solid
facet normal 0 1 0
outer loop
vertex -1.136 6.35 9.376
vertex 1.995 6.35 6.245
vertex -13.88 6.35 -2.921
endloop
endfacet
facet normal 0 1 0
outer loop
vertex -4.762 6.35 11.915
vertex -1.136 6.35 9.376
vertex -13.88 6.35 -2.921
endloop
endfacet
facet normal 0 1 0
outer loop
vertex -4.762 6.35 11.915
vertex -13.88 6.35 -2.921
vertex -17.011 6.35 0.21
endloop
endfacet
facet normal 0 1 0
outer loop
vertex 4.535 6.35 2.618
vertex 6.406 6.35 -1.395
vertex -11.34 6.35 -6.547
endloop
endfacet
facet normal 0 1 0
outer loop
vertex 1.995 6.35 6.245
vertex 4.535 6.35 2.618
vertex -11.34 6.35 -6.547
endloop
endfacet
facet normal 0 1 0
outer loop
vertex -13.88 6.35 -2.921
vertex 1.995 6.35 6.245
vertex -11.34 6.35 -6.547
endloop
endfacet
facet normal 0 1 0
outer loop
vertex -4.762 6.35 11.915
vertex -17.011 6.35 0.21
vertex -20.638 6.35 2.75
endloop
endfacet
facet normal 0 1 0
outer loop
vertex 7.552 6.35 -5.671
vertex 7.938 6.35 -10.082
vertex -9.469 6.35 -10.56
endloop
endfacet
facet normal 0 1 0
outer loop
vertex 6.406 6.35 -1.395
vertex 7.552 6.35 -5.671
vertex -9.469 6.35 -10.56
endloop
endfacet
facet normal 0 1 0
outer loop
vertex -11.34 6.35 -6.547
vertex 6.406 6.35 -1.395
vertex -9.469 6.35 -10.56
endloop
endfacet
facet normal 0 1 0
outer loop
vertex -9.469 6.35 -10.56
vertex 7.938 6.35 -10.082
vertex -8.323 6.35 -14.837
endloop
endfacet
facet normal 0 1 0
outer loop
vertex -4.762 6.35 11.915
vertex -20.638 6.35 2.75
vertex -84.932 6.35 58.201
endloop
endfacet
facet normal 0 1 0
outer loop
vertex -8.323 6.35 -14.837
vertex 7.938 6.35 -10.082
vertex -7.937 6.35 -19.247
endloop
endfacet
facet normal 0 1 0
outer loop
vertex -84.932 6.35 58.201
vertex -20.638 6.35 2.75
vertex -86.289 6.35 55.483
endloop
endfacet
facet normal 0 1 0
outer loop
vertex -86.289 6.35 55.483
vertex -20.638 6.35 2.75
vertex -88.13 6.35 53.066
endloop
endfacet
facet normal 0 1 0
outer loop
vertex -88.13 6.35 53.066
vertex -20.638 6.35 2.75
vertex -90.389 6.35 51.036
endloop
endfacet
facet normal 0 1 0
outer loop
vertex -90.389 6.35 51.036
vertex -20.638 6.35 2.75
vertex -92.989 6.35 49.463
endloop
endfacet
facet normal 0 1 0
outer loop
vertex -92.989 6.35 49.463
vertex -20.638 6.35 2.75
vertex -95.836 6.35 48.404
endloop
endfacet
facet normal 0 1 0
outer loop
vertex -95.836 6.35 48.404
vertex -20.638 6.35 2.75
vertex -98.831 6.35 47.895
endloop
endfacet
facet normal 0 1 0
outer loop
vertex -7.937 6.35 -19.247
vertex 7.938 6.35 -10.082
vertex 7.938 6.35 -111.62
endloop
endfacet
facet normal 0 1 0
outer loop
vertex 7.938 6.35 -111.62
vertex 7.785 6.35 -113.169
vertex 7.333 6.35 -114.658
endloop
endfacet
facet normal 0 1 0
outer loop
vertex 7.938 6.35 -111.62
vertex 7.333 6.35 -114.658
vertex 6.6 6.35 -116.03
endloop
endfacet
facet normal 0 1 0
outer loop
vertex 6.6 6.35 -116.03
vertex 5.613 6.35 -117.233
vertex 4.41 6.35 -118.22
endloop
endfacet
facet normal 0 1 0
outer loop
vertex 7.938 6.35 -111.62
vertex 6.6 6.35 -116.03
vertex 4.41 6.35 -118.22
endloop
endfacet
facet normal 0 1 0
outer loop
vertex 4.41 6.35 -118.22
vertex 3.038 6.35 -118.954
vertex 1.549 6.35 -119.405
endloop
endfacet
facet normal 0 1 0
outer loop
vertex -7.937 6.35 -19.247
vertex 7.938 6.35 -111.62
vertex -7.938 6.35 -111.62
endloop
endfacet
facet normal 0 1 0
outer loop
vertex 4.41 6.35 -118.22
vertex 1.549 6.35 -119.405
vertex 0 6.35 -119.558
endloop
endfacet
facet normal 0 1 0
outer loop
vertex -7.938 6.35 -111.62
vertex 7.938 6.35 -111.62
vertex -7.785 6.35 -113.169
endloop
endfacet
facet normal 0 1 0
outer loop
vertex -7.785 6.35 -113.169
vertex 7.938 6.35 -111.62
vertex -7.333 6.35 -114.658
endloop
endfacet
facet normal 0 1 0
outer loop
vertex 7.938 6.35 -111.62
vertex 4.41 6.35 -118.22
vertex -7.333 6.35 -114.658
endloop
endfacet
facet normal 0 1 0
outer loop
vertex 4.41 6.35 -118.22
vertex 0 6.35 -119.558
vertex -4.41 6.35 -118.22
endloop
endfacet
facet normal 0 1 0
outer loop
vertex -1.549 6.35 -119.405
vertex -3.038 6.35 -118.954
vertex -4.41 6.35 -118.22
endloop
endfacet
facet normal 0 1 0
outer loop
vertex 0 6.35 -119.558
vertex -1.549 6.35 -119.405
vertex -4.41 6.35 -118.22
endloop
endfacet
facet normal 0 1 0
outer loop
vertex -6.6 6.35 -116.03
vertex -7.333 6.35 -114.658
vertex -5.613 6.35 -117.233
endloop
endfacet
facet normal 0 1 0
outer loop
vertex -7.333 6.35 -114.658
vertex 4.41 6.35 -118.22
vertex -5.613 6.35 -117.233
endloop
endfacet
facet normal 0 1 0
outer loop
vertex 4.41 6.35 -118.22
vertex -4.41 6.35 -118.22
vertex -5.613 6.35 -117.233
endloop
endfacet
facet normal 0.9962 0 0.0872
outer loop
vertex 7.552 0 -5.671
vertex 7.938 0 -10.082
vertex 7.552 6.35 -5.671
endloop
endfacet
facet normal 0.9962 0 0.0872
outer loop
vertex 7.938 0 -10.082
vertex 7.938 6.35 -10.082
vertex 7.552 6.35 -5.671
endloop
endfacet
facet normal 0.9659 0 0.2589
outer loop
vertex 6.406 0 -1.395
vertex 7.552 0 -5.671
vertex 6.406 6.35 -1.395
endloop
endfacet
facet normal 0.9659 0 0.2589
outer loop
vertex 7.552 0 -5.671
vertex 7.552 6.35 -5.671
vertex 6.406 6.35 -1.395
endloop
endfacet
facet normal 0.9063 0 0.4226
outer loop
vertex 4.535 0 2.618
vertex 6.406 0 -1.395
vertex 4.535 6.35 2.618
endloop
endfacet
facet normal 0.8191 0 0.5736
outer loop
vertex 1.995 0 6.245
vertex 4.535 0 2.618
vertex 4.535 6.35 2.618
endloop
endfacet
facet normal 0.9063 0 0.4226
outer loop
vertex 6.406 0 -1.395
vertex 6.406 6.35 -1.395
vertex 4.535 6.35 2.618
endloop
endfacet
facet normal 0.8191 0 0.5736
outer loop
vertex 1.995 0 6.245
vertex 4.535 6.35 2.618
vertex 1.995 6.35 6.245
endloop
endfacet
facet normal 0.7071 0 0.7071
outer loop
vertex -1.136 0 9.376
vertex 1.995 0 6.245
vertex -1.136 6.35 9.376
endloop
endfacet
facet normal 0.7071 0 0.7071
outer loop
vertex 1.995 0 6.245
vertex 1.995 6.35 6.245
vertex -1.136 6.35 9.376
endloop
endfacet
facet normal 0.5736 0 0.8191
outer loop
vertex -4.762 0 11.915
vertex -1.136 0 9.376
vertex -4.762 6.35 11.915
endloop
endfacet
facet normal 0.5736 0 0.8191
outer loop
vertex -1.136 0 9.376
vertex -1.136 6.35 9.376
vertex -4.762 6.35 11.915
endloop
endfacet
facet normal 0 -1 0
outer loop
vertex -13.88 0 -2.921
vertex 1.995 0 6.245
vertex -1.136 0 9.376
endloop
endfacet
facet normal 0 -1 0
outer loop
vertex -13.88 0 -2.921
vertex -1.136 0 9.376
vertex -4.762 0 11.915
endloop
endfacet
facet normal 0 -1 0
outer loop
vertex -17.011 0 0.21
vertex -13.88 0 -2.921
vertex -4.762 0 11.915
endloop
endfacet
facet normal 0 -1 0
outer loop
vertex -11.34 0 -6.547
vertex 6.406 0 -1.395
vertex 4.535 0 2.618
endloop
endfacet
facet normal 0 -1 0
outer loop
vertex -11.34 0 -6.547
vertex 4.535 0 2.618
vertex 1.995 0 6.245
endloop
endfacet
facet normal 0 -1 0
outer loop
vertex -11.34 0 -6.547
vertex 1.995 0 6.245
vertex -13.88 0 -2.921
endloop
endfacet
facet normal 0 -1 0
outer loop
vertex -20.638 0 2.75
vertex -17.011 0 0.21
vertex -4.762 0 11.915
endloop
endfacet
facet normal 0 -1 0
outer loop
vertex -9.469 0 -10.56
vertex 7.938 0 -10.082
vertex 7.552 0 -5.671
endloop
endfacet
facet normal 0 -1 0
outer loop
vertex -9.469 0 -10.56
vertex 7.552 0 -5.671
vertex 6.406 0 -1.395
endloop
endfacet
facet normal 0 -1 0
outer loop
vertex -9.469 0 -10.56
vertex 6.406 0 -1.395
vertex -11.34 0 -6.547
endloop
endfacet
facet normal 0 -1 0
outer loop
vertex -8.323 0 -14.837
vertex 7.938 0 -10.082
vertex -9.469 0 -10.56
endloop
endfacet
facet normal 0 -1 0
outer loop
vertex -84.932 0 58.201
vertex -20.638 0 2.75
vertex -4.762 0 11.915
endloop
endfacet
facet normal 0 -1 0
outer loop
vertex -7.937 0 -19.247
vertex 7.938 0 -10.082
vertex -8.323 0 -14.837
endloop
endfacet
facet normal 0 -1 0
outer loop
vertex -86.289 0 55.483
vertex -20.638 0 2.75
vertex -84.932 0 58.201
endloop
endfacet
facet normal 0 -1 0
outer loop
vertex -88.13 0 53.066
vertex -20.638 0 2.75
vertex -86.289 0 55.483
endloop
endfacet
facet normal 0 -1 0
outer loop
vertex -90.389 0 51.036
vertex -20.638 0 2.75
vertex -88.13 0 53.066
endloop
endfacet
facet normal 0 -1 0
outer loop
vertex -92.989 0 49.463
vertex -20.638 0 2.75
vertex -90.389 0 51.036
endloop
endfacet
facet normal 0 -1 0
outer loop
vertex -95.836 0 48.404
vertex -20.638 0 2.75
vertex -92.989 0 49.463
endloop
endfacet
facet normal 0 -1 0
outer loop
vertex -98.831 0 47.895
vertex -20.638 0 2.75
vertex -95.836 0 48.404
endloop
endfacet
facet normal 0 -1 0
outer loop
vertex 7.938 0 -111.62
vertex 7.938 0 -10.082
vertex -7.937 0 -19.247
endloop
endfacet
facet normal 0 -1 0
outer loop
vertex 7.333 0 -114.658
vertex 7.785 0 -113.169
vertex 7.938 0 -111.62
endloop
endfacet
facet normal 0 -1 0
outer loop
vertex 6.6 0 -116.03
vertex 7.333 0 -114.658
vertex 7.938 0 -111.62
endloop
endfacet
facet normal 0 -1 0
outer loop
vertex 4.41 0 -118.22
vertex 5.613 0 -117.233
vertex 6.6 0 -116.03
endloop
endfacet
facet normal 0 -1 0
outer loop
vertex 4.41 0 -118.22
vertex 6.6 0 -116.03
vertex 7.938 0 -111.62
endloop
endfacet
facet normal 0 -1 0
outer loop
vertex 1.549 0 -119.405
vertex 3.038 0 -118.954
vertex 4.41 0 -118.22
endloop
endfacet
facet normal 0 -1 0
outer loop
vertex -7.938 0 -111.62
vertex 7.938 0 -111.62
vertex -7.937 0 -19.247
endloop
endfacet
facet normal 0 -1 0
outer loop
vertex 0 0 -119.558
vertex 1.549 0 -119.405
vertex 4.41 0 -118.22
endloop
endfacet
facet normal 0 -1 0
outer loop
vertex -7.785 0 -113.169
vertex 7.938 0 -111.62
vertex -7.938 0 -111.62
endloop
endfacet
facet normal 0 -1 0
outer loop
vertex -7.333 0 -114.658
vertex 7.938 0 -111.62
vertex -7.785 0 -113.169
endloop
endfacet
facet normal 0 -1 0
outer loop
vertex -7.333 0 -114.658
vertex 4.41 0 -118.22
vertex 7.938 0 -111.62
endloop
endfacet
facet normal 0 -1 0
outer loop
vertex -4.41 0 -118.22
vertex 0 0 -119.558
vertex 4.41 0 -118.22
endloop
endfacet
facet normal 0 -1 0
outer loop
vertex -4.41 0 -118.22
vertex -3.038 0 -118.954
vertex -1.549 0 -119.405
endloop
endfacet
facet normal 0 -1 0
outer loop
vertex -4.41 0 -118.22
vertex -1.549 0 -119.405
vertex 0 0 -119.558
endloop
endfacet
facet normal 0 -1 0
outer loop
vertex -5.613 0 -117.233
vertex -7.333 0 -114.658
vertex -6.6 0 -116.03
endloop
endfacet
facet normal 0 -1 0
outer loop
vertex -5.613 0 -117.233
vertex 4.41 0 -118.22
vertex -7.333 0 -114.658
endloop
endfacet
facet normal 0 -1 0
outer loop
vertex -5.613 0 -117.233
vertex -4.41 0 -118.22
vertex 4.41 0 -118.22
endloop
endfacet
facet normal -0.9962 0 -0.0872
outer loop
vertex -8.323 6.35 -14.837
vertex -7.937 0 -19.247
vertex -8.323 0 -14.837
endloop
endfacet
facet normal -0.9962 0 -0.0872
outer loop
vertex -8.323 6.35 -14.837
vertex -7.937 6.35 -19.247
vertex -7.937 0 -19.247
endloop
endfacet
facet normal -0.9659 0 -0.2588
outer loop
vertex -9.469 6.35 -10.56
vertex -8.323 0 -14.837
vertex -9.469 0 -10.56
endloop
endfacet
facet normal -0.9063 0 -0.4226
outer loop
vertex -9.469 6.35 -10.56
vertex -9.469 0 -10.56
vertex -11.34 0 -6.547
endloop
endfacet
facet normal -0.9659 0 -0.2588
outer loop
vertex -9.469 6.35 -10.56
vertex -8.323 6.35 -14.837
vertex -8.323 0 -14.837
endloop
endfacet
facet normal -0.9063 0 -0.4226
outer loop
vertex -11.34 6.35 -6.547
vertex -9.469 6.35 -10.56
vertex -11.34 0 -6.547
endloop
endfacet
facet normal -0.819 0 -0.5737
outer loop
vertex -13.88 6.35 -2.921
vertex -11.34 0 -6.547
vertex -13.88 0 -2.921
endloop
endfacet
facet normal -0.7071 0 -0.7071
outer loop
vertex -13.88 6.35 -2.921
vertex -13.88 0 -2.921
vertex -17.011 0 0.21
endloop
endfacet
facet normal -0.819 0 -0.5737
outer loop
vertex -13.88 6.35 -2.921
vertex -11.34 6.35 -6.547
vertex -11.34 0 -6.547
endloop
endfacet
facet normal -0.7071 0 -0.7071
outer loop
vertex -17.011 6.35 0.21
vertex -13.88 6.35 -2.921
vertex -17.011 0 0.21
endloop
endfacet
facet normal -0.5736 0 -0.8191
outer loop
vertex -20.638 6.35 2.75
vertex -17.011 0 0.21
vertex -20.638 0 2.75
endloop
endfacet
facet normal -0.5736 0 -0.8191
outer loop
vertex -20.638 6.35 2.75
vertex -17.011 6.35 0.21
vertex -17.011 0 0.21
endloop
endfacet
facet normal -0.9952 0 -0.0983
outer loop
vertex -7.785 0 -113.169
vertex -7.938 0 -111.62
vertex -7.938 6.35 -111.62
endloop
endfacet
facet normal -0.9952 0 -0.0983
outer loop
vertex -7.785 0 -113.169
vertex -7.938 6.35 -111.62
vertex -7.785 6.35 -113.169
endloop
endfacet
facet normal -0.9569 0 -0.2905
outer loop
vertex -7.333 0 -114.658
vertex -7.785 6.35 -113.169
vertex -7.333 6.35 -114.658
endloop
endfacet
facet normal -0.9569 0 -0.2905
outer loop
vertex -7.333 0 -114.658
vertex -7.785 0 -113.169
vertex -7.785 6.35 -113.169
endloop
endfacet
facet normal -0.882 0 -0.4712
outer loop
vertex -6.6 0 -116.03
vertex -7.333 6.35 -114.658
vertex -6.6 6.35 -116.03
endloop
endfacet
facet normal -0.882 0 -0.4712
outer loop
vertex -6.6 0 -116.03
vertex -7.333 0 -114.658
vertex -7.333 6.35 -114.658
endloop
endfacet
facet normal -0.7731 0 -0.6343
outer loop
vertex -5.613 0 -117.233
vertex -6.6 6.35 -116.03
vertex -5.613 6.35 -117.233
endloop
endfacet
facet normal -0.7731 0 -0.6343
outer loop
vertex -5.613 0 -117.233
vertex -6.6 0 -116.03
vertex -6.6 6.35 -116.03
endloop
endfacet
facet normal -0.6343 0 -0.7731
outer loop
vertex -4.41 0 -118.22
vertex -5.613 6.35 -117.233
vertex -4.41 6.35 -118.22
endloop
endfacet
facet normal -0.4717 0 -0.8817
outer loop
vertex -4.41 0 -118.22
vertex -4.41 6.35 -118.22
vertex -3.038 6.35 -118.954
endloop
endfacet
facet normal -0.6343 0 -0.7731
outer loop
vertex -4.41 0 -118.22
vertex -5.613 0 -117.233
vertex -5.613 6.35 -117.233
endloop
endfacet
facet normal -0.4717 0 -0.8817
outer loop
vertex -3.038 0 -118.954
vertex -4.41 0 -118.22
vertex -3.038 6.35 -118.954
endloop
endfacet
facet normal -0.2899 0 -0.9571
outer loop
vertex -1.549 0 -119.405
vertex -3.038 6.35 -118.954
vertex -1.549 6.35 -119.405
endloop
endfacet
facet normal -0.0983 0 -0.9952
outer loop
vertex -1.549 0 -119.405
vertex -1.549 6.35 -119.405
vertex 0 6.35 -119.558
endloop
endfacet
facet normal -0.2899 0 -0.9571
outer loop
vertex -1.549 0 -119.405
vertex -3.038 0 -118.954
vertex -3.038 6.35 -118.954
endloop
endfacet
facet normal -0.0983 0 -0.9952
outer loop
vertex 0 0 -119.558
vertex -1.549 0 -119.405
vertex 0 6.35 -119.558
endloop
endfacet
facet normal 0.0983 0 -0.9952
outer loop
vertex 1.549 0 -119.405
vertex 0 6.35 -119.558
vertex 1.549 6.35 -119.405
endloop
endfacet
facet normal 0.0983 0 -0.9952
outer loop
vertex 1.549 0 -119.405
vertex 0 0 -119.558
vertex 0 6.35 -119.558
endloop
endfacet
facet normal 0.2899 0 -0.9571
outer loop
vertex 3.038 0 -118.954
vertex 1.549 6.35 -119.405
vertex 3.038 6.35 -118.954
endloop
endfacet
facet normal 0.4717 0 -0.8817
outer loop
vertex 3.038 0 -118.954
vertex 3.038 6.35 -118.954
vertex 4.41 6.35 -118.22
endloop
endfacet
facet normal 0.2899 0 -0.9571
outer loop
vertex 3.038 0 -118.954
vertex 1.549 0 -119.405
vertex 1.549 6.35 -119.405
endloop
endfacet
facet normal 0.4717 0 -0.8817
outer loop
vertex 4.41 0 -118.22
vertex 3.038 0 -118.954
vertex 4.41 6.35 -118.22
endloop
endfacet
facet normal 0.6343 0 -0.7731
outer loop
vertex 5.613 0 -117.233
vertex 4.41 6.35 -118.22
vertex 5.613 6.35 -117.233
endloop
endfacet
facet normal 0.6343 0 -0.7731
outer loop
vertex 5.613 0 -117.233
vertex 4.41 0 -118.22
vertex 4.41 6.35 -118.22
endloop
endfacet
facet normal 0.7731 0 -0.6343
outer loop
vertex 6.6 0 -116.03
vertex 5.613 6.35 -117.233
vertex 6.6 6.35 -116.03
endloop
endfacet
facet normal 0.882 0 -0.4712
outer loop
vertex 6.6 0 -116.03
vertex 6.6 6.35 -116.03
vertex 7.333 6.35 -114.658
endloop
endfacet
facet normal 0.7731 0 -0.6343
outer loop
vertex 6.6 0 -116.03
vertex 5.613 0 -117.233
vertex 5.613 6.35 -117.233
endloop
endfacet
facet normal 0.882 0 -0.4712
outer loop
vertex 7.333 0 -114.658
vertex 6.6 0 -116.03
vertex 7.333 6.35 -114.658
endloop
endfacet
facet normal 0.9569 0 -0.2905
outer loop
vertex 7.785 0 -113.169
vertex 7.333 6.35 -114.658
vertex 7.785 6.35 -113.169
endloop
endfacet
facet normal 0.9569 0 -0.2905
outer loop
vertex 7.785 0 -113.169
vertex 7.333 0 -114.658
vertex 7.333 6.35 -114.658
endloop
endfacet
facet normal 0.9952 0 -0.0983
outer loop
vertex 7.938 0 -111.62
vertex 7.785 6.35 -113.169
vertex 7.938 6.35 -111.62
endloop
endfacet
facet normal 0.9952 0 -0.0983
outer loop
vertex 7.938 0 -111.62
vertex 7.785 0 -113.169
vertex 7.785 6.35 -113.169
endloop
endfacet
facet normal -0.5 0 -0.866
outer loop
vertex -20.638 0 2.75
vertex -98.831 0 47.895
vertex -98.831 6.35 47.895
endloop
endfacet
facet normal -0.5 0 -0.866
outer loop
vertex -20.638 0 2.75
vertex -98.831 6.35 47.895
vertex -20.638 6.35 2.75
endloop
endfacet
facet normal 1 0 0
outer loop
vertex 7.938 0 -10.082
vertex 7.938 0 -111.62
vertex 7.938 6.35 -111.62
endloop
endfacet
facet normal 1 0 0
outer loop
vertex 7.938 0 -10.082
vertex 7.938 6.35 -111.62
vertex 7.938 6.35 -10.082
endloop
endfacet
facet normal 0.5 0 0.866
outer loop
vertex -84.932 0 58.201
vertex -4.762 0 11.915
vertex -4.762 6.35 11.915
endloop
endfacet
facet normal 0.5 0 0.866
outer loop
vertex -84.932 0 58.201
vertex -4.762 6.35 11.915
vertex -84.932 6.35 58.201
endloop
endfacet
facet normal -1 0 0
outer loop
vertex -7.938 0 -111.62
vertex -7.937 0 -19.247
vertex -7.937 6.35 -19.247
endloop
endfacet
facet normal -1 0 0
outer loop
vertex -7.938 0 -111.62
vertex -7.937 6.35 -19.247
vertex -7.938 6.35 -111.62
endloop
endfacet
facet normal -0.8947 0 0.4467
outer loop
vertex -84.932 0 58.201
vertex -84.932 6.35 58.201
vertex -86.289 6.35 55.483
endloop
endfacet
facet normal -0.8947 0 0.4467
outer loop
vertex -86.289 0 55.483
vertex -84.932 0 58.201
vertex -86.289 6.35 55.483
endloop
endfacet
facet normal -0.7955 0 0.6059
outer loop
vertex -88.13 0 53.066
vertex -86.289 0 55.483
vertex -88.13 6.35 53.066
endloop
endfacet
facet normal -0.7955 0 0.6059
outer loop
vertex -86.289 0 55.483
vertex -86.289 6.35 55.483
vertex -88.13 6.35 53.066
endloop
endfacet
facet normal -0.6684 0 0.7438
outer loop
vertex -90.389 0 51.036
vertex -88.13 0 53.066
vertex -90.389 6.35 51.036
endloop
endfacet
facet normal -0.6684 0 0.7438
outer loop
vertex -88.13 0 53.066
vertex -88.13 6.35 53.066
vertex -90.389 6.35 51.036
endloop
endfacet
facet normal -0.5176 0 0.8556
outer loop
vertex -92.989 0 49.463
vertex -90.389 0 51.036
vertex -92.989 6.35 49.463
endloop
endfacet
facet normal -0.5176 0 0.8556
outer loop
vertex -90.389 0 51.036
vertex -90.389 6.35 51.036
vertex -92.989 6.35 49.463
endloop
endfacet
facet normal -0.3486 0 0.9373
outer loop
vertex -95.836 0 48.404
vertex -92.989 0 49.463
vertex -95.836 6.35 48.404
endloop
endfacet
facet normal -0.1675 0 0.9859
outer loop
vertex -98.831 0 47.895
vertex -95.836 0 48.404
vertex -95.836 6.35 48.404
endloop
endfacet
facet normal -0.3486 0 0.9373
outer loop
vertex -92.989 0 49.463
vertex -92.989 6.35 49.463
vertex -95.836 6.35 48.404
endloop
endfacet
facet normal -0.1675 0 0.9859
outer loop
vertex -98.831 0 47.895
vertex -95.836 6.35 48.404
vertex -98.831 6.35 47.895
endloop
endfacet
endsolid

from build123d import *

# Parameters (mm, degrees)
BOSS_EXTRUDE1_DEPTH = 6.35
CUT_EXTRUDE1_DEPTH  = 158.804246512
FILLET1_R           = 25.4


with BuildPart() as part:
    # Sketch1 → Boss-Extrude1 (new body)
    with BuildSketch(Plane(origin=(0, 0, 0), x_dir=(1, 0, 0), z_dir=(0, 1, 0))):
        with BuildLine():
            Line((7.9375, 111.6203), (7.9375, -4.582717762))
            Line((7.9375, -4.582717762), (-90.893507667, -61.642826643))
            ThreePointArc((-90.893507667, -61.642826643), (-101.73633431, -58.7375), (-98.831007667, -47.894673357))
            Line((-98.831007667, -47.894673357), (-7.9375, 4.582717762))
            Line((-7.9375, 4.582717762), (-7.9375, 111.6203))
            ThreePointArc((-7.9375, 111.6203), (0, 119.5578), (7.9375, 111.6203))
        make_face()
    extrude(amount=BOSS_EXTRUDE1_DEPTH)

    # Sketch2 → Cut-Extrude1 (cut, through all)
    with BuildSketch(Plane(origin=(0, 6.35, 0), x_dir=(1, 0, 0), z_dir=(0, 1, 0))):
        with BuildLine():
            Line((-90.893507667, -61.642826643), (-84.931832215, -58.200851716))
            ThreePointArc((-84.931832215, -58.200851716), (-90.389422779, -51.035617044), (-98.831007667, -47.894673357))
            ThreePointArc((-98.831007667, -47.894673357), (-101.73633431, -58.7375), (-90.893507667, -61.642826643))
        make_face()
    extrude(amount=-CUT_EXTRUDE1_DEPTH, mode=Mode.SUBTRACT)

    # Fillet1
    fillet1_edges = [part.edges().sort_by_distance(p)[0] for p in [
        (7.9375, 3.175, 4.582717762),
        (-7.9375, 3.175, -4.582717762),
    ]]
    fillet(fillet1_edges, radius=FILLET1_R)


solid = part.part
